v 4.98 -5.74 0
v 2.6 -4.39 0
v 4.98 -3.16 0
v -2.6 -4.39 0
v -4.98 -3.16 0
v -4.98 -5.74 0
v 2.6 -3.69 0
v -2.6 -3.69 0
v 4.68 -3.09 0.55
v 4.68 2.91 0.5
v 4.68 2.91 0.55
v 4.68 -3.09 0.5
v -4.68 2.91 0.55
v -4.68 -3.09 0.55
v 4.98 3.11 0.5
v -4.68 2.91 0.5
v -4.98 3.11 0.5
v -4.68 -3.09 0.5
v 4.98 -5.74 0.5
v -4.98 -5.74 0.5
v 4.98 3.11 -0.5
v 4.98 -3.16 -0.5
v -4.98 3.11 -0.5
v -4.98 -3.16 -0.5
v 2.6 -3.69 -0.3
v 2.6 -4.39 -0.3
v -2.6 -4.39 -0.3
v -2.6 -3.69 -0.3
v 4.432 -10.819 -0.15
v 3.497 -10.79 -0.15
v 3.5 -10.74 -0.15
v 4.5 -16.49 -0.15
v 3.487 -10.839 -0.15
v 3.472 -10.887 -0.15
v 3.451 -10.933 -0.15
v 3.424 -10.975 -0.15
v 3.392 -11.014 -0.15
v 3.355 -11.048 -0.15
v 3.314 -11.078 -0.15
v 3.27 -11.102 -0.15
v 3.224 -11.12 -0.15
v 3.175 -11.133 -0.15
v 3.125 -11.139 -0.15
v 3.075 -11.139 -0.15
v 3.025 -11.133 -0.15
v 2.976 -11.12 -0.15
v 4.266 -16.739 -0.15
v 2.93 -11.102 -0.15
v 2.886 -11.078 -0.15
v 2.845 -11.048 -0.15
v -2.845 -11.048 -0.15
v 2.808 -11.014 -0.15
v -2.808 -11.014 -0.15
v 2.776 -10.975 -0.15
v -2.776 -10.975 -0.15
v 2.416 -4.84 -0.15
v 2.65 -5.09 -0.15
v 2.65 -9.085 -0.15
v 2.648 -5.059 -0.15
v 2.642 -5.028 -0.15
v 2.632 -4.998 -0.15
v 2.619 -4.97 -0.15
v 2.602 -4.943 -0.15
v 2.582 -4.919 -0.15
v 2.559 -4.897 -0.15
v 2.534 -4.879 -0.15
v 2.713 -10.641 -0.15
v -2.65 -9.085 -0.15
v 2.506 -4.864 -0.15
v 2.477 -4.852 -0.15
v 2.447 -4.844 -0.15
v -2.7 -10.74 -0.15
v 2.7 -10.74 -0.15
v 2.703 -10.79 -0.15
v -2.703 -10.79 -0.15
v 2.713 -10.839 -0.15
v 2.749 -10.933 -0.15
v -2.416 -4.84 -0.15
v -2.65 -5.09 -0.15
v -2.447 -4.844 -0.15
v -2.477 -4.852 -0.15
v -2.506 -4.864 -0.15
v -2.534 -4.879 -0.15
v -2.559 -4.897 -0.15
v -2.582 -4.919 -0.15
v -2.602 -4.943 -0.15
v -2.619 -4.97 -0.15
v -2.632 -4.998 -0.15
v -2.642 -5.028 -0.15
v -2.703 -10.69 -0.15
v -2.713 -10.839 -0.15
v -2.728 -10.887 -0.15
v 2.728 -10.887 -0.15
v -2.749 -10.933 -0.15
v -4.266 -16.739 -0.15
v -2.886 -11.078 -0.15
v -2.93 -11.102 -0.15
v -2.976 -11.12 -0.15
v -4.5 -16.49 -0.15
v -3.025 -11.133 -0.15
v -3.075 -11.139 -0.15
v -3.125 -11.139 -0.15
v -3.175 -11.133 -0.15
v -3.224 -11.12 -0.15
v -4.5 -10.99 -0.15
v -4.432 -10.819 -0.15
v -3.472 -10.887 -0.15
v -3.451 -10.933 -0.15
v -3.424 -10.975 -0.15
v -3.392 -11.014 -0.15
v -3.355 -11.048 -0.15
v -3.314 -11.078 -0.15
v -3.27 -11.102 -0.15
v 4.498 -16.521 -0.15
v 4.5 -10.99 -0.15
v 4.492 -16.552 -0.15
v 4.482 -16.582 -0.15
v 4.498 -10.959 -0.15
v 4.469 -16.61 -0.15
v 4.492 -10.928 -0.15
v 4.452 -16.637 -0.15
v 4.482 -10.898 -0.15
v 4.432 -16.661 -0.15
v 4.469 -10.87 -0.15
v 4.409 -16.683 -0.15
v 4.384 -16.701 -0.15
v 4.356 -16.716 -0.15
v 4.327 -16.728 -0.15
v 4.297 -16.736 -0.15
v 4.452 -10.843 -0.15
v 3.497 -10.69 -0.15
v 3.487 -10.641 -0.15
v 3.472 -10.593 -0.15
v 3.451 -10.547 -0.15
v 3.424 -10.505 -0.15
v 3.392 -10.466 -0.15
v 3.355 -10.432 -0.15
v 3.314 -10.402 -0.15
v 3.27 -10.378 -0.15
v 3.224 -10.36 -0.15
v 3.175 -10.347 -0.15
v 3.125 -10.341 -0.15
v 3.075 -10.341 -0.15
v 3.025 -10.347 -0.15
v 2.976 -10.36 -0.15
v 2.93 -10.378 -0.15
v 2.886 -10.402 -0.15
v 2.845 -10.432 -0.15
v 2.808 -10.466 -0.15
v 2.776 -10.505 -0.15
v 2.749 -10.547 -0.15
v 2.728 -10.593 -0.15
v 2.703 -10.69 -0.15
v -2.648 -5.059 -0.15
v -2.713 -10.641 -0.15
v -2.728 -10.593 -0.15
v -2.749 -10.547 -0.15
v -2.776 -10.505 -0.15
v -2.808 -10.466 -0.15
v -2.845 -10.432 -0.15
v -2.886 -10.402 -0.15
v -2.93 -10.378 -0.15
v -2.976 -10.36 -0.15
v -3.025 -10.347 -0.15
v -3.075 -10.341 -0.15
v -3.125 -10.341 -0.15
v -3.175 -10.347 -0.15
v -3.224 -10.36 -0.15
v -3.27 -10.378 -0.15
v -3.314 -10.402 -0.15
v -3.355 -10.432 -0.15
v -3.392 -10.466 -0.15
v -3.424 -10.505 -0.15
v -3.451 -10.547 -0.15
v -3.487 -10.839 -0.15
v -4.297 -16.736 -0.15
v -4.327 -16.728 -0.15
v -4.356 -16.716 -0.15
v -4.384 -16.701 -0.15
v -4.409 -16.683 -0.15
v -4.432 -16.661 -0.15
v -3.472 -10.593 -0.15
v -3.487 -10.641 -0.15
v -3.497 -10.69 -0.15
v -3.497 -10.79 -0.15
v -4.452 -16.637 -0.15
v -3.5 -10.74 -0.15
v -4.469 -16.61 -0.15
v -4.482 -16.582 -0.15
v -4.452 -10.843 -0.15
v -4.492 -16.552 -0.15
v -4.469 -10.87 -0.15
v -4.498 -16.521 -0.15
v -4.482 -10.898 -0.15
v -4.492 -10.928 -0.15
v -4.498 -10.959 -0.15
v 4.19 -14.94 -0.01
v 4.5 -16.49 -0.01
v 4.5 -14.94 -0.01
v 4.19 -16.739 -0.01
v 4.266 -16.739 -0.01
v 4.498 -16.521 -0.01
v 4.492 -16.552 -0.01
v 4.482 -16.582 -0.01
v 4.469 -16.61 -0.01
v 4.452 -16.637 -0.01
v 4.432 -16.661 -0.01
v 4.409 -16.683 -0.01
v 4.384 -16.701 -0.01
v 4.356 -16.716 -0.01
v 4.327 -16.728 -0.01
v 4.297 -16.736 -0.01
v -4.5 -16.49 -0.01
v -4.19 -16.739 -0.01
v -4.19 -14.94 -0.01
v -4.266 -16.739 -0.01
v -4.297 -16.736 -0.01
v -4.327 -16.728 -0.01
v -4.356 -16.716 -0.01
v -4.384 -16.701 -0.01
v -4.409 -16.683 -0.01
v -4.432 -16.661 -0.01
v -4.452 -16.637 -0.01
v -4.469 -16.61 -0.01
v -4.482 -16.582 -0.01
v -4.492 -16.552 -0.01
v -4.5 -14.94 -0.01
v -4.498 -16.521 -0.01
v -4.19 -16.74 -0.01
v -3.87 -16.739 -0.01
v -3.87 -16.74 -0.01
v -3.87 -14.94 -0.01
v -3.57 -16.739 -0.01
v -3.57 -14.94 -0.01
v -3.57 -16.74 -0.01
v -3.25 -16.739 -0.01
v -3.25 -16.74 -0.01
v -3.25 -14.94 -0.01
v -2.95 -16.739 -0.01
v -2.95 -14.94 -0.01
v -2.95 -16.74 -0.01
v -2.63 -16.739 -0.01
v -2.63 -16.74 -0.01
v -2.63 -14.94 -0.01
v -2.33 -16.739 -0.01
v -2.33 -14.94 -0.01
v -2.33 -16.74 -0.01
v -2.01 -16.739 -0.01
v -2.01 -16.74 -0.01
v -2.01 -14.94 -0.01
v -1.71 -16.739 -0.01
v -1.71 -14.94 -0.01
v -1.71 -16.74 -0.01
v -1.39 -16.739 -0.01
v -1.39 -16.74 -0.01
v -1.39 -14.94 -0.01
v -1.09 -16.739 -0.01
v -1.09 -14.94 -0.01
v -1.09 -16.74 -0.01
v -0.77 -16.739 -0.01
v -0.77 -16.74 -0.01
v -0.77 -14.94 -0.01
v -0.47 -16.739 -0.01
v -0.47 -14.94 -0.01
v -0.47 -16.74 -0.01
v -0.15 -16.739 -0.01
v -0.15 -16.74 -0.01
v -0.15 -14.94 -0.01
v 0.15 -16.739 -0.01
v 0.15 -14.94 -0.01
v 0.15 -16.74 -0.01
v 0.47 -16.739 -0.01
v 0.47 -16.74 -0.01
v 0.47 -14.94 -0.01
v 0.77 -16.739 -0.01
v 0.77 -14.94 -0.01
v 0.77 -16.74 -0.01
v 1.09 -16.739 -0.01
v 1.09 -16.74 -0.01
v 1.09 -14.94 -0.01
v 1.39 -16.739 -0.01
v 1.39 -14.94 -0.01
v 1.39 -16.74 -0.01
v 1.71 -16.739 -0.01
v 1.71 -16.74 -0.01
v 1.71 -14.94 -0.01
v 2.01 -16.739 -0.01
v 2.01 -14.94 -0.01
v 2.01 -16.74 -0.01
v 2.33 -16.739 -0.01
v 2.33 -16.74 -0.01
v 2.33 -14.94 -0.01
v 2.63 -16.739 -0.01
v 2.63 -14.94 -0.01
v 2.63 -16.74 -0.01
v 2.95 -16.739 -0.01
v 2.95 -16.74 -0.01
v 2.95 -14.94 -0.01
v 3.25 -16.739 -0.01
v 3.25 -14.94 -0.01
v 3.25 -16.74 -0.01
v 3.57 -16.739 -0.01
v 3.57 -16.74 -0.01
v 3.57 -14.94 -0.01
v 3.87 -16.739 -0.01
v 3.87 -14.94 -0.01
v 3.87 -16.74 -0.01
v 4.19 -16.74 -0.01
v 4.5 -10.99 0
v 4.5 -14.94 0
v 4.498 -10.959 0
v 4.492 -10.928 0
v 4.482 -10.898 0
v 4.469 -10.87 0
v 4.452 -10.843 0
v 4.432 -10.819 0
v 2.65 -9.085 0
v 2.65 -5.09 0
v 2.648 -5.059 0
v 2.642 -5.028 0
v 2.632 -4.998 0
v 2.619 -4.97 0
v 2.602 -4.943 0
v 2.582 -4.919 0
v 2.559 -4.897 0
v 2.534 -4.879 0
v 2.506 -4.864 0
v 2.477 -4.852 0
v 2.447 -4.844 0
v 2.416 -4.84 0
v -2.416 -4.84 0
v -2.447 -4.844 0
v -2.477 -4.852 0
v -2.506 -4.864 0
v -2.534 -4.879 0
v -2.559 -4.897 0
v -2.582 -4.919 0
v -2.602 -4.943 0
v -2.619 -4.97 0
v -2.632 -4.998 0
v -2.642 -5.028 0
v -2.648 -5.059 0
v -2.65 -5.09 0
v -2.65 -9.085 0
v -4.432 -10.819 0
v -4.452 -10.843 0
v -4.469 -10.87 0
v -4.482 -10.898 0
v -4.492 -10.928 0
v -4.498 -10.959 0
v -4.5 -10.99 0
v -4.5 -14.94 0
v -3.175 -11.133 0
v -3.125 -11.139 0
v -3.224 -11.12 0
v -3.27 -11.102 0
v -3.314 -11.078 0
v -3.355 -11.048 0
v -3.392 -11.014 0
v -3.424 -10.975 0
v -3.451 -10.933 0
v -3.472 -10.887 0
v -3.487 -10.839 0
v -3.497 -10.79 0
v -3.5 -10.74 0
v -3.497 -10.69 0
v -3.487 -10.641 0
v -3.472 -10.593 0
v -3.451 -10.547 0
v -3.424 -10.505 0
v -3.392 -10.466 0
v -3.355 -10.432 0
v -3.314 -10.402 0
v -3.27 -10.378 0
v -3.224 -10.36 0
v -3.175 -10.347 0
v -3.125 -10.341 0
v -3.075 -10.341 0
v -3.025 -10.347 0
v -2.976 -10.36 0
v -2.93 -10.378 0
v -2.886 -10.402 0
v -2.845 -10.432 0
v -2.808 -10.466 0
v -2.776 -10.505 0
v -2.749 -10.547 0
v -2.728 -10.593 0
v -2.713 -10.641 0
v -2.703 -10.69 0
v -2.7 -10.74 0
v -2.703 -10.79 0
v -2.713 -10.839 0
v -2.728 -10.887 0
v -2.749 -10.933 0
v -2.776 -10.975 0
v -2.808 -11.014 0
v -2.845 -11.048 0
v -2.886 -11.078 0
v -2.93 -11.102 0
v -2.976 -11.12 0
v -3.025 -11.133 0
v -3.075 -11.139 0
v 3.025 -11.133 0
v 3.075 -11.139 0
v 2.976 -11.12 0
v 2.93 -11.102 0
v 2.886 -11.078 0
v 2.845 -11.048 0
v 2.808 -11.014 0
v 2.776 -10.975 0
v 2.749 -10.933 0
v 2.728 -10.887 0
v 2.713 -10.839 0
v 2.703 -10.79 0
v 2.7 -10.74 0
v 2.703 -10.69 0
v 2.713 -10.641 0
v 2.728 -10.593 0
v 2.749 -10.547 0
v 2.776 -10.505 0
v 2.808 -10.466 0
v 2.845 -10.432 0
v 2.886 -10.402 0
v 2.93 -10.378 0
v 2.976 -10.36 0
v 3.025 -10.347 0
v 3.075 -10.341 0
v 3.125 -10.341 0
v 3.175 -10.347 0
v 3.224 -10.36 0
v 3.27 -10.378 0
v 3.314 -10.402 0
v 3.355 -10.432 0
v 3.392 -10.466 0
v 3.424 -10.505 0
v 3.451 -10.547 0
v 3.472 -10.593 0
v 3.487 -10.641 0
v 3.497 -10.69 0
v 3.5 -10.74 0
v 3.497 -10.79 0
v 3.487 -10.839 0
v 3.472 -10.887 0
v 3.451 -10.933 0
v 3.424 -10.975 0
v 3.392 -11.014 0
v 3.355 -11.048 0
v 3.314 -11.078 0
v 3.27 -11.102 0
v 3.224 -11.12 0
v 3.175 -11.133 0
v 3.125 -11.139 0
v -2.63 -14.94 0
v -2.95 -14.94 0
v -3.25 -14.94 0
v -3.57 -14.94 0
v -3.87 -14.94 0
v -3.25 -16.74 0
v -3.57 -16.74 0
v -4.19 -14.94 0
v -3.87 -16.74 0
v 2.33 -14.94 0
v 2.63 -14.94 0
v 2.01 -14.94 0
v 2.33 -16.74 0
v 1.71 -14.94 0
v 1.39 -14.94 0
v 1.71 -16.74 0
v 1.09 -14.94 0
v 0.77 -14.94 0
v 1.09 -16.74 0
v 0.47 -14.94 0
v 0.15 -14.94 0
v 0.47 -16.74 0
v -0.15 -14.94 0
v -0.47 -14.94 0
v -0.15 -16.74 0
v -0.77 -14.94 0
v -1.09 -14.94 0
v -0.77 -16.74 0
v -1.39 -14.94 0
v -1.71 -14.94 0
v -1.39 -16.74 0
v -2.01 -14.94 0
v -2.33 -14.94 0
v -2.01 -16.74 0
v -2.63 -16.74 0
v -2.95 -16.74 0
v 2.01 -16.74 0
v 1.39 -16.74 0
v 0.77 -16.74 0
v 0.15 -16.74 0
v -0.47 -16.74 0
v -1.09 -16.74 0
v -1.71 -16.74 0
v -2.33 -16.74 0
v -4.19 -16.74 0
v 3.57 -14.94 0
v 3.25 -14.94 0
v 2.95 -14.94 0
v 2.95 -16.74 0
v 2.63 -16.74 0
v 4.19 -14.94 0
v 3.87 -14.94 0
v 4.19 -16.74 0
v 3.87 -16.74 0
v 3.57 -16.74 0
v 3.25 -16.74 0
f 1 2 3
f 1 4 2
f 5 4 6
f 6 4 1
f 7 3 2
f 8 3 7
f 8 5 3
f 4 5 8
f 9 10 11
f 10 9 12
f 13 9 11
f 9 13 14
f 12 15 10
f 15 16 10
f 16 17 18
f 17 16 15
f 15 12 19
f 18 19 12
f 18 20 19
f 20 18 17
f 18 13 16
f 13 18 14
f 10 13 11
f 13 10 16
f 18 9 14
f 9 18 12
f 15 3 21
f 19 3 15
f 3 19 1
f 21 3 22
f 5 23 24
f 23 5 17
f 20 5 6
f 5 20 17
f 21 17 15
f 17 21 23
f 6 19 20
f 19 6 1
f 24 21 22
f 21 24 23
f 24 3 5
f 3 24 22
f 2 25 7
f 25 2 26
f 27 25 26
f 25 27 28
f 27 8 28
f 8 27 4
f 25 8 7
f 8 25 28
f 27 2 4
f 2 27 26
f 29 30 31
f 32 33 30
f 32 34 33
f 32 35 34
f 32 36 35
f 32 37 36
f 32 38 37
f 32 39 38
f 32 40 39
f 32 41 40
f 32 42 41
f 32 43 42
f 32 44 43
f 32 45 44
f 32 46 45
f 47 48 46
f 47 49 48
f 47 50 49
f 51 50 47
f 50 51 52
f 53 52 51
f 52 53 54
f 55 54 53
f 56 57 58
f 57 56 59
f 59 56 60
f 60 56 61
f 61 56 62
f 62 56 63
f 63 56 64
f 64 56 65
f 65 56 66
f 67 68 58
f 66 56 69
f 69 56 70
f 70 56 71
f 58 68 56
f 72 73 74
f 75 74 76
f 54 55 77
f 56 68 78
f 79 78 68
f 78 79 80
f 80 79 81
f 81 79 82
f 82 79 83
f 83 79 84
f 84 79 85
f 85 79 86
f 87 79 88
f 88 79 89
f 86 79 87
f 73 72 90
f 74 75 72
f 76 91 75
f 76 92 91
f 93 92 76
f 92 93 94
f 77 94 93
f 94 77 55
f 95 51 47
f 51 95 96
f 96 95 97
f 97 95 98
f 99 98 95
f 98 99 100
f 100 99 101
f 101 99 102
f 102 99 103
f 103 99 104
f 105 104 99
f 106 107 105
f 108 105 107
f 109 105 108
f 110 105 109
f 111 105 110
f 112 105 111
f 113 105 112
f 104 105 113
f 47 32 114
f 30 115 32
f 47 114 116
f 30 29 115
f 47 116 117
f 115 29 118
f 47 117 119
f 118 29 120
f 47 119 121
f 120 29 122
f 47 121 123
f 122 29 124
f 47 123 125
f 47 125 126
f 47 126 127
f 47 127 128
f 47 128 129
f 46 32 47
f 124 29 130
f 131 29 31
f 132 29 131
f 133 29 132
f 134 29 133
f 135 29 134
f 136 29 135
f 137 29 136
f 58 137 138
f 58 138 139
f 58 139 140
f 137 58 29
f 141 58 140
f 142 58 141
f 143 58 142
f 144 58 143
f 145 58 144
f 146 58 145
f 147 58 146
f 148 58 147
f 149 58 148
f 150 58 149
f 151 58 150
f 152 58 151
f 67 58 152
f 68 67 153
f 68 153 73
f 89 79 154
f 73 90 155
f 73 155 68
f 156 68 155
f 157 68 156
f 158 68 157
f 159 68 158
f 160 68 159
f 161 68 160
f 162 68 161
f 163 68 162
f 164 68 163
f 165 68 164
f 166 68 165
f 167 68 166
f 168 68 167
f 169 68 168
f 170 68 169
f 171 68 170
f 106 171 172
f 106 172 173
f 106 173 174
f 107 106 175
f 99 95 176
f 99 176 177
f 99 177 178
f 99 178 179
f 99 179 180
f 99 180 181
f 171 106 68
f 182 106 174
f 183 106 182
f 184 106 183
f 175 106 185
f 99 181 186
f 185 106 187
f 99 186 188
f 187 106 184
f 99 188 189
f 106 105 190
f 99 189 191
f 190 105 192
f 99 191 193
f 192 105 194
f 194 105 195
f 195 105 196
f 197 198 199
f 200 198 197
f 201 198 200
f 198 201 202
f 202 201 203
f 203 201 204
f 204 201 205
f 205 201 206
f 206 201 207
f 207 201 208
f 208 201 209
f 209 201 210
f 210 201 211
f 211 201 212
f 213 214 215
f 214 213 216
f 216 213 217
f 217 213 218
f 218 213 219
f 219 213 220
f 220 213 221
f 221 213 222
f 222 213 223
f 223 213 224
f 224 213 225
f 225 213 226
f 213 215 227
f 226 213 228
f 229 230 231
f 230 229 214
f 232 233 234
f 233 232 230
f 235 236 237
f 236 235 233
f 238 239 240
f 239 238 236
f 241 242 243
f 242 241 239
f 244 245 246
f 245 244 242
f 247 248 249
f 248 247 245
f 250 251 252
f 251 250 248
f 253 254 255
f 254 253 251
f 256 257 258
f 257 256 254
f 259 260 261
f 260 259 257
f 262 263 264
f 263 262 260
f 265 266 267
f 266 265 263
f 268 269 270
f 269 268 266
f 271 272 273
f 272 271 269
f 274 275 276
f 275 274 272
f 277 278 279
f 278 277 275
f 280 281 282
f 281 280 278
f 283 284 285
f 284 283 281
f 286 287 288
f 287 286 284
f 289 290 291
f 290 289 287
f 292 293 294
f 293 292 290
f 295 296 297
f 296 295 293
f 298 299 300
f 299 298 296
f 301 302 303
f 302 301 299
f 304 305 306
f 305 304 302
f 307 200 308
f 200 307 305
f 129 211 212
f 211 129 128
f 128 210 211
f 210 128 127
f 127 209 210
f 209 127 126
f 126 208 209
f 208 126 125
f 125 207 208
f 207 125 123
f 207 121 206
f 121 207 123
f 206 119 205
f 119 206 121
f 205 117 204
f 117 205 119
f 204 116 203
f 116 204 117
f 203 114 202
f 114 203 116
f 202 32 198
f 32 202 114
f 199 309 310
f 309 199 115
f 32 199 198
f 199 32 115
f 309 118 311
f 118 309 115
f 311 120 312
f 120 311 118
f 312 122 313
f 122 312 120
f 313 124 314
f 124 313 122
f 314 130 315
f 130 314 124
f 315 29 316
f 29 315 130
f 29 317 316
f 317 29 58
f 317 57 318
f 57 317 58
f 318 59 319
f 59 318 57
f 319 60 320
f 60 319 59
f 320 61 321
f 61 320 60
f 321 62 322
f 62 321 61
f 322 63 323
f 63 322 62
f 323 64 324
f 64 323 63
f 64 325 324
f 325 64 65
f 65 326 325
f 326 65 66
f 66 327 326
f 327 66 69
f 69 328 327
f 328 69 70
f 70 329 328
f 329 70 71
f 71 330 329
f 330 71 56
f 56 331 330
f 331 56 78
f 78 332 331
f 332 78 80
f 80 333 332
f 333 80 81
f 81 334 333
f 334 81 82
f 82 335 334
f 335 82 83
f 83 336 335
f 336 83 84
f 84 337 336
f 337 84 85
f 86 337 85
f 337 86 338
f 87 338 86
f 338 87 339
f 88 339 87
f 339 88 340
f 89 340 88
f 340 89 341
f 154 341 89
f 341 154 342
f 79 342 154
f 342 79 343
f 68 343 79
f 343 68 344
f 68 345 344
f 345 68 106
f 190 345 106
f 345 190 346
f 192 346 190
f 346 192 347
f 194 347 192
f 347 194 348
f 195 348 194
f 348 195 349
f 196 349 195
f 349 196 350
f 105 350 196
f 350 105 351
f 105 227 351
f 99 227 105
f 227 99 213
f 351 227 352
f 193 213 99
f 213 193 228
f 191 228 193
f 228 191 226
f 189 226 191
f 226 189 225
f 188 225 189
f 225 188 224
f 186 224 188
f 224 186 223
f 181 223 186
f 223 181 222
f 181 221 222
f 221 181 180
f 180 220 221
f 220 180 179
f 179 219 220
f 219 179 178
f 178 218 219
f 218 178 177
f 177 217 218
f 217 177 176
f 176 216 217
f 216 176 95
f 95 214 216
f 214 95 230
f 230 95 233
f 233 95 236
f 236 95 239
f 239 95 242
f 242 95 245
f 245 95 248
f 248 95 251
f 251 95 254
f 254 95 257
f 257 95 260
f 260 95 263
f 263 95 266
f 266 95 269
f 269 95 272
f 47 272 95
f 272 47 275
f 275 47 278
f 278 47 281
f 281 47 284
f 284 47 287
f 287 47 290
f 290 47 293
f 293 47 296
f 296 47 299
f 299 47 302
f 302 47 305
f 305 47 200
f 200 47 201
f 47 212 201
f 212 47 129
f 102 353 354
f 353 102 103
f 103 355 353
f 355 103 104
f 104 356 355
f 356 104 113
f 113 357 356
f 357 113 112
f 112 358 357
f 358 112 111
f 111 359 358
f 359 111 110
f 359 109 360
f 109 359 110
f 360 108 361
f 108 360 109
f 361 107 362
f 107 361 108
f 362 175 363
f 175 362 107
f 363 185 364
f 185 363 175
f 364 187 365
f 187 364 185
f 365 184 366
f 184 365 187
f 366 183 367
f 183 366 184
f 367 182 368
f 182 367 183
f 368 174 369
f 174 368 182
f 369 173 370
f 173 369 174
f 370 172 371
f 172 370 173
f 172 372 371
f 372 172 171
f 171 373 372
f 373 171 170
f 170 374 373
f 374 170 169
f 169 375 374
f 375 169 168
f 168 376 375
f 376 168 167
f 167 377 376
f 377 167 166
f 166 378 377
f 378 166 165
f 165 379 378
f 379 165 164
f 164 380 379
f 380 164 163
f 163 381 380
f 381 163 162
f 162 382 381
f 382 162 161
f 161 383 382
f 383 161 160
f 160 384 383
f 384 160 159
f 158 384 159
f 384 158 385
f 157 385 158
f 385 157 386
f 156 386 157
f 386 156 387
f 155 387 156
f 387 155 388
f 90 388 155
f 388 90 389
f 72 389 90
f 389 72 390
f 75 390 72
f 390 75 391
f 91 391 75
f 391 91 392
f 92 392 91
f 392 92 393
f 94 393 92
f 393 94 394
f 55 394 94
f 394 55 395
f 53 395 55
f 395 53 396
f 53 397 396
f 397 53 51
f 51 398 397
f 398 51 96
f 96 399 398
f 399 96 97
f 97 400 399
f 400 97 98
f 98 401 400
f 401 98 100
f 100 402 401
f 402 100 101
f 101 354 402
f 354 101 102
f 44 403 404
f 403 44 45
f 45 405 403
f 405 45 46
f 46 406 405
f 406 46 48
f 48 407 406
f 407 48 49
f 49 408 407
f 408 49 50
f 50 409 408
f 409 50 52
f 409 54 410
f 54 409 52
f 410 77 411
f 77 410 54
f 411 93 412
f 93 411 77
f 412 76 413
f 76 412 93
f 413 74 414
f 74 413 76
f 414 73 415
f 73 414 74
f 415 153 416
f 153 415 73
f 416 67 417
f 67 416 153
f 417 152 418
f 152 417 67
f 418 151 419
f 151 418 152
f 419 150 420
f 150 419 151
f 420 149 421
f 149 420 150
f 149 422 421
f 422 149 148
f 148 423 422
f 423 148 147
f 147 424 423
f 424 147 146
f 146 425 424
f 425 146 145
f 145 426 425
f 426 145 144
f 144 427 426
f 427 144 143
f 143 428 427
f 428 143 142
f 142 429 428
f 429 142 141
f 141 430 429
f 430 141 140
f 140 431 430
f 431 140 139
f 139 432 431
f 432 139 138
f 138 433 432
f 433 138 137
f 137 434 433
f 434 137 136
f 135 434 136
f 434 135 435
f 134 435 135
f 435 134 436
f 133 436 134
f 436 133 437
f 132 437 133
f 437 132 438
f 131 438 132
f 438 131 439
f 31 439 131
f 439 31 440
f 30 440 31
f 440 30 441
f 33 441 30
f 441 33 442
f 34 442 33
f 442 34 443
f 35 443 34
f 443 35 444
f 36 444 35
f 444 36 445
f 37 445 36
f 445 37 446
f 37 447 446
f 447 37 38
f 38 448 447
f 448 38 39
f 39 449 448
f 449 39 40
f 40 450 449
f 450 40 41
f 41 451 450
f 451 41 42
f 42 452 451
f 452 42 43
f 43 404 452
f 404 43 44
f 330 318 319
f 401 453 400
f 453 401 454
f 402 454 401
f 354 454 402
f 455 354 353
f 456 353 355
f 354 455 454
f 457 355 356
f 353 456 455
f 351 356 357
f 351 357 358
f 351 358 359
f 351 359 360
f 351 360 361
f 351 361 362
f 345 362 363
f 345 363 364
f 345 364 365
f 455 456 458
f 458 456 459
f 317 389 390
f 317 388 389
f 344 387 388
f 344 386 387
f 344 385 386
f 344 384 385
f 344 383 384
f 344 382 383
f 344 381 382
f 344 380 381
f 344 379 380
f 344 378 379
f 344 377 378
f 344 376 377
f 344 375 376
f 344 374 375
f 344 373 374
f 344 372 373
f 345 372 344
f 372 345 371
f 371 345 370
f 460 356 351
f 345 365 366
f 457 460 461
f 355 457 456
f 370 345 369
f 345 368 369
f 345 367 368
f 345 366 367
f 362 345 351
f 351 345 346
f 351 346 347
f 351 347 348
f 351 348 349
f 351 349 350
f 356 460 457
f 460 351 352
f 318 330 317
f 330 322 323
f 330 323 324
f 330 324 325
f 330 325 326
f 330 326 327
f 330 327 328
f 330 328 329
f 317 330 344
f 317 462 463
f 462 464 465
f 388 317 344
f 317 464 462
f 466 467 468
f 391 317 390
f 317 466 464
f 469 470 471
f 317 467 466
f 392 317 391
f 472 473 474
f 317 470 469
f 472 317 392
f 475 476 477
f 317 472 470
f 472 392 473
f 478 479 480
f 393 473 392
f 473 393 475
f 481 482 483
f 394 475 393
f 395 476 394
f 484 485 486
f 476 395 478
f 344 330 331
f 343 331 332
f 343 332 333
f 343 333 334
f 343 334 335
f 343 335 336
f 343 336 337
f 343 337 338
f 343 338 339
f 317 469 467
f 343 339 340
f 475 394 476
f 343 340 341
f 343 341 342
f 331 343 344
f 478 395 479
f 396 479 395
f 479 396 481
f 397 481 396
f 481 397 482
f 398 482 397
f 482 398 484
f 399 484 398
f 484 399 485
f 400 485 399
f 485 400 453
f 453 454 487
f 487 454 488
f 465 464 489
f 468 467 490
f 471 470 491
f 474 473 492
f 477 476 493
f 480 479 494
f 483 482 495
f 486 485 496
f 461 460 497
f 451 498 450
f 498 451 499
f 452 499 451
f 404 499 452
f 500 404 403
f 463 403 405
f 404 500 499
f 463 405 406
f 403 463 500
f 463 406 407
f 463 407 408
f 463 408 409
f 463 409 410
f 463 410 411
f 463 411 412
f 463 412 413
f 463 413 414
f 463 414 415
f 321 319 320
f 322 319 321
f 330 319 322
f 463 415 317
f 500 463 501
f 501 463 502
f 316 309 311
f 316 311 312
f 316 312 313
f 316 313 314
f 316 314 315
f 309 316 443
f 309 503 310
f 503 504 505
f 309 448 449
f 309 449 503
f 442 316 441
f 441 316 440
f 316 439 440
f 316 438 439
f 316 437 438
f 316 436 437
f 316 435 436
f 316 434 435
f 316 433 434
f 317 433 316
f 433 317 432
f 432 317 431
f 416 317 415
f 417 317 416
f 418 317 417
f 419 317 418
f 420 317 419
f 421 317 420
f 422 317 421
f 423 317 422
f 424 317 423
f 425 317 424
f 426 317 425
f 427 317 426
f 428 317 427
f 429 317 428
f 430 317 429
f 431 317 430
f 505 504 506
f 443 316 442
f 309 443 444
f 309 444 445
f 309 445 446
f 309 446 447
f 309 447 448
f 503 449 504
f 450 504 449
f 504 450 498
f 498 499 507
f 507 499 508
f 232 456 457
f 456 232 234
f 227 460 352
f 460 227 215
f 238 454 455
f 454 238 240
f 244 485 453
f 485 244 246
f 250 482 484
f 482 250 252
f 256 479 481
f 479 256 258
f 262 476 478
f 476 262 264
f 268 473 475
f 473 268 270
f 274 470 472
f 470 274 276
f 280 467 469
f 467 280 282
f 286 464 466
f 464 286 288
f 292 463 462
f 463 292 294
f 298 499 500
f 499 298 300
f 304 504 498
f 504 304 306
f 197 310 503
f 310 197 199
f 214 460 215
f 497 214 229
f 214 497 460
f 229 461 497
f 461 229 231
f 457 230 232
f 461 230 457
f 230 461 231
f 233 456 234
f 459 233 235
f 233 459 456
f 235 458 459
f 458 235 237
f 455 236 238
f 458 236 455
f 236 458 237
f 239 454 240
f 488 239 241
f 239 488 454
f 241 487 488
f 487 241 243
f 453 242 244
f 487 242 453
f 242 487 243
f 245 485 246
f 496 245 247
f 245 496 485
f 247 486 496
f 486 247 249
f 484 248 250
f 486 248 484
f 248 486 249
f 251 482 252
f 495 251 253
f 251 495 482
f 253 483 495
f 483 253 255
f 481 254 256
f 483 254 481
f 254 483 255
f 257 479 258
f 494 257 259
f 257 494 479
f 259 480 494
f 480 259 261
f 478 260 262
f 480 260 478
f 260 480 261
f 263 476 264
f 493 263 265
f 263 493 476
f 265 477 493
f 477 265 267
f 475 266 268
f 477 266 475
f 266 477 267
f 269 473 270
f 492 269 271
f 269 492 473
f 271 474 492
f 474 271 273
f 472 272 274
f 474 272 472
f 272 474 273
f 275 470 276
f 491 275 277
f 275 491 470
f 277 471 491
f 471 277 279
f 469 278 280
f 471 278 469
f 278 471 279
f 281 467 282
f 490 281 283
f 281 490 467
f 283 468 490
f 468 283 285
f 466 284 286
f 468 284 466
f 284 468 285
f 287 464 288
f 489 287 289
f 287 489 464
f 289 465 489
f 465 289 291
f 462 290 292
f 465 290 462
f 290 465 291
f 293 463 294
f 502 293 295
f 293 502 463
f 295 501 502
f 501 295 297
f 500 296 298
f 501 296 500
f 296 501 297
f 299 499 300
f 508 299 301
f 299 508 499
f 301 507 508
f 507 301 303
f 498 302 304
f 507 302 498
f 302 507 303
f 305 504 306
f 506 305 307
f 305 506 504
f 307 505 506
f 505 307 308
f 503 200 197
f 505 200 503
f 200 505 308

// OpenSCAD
$fn=50;

TP_TOX32();
module TP_TOX32(){
  //https://tailorpixels.com/de/PRODUKTE/0-32-Zoll-oled-60x32-wei%C3%9F-i2c-ssd1315/
  glassThck=0.5;
  
  //Flex
  flxRad=0.25; //edge rad of Flex
  flxPnlDims=[5.3,0.9]; //Dimensions of Flex on Panel
  flxTapDims=[9,6];
  flxThck=0.15;
  //Length of Flex from panel to tap
  flxLen=11;
  //holes in the flex
  flxHoleDist=6.2;
  flxHoleDia=0.8;
  //offset from bottom
  flxHoleBtmOffset=6;
  
  //Panel
  panelDims=[9.96,8.85,1.0];
  polDims=[9.36,6,0.05];
  botGlassDims=[panelDims.x,6.27,glassThck];
  chipDims=[5.2,0.7,0.3];
  
  //Active Area
  AADims=[7.06,3.82,0.01]; //active Area
  
  //panel offsets from top left corner
  pol2PanelOffset=[0,-0.2,glassThck+polDims.z/2];
  AA2PanelOffset=[0,-1.2,AADims.z/2];
  bot2PanelOffset=[0,0,-glassThck/2];
  chip2PanelOffset=[0,-6.8,-chipDims.z/2];
  //
  panel2CenterOffset=[0,-panelDims.y/2+1.2+AADims.y/2,0];
  
  padPitch=0.62;
  padDims=[0.32,1.8,0.01];
  padCnt=14;
  
  
//Panel
translate(panel2CenterOffset){
  //Active Area
  color("SlateGrey") translate([0,(panelDims.y-AADims.y)/2,0]+AA2PanelOffset) cube(AADims,true);
  //Polarizer
  color("grey",0.5)
    translate([0,(panelDims.y-polDims.y)/2,0]+pol2PanelOffset) cube(polDims,true);
  //topGlass
  color("lightgrey",0.5) 
    translate([0,0,glassThck/2]) cube([panelDims.x,panelDims.y,glassThck],true);
  //btmGlass
  color("lightgrey",0.5)
    translate([0,(panelDims.y-botGlassDims.y)/2,0]+bot2PanelOffset) cube(botGlassDims,true);
  //chip
  color("darkSlateGrey")
    translate([0,(panelDims.y-chipDims.y)/2,0]+chip2PanelOffset) cube(chipDims,true);
}
  //flex();
  translate([0,-panelDims.y/2,-flxThck]+panel2CenterOffset) flex();

  module flex(){
    
    color("tan") linear_extrude(flxThck-padDims.z) flexShape();
    color("orange") translate([0,0,flxThck-padDims.z]) linear_extrude(padDims.z) difference(){
      flexShape();
      translate([0,-flxLen+padDims.y/2]) square([flxTapDims.x,padDims.y],true);
    }
    
    //pads
    color("gold") translate([0,0,flxThck-padDims.z]) linear_extrude(padDims.z) for (i=[-(padCnt-1)/2:(padCnt-1)/2])
      translate([i*padPitch,-flxLen+padDims.y/2]) square([padDims.x,padDims.y],true);
    
    module flexShape(){
     difference(){
        union(){
          //tap
          hull(){
            for (ix=[-1,1],iy=[-1,1])
              translate([ix*(flxTapDims.x/2-flxRad),iy*(flxTapDims.y/2-flxRad)-flxLen+flxTapDims.y/2]) circle(flxRad);
          }
          //main
          hull(){
            for (ix=[-1,1],iy=[-1,1])
              translate([ix*(flxPnlDims.x/2-flxRad),iy*((flxLen+flxPnlDims.y)/2-flxRad)-(flxLen-flxPnlDims.y)/2]) 
                circle(flxRad);
          }
          //45° transistion between tap an main flex
          hull(){
           for (ix=[-1,1])
              translate([ix*(flxPnlDims.x/2-flxRad),((flxLen+flxPnlDims.y)/2-flxRad)-flxLen+(flxTapDims.x-flxPnlDims.x)/2]) 
                circle(flxRad);
            for (ix=[-1,1])
              translate([ix*(flxTapDims.x/2-flxRad),(flxTapDims.y/2-flxRad)-flxLen+flxTapDims.y/2]) circle(flxRad);
            }
          }
        
        for (ix=[-1,1])
          translate([ix*flxHoleDist/2,flxHoleBtmOffset-flxLen]) circle(d=flxHoleDia);
      }
    }
}
}
